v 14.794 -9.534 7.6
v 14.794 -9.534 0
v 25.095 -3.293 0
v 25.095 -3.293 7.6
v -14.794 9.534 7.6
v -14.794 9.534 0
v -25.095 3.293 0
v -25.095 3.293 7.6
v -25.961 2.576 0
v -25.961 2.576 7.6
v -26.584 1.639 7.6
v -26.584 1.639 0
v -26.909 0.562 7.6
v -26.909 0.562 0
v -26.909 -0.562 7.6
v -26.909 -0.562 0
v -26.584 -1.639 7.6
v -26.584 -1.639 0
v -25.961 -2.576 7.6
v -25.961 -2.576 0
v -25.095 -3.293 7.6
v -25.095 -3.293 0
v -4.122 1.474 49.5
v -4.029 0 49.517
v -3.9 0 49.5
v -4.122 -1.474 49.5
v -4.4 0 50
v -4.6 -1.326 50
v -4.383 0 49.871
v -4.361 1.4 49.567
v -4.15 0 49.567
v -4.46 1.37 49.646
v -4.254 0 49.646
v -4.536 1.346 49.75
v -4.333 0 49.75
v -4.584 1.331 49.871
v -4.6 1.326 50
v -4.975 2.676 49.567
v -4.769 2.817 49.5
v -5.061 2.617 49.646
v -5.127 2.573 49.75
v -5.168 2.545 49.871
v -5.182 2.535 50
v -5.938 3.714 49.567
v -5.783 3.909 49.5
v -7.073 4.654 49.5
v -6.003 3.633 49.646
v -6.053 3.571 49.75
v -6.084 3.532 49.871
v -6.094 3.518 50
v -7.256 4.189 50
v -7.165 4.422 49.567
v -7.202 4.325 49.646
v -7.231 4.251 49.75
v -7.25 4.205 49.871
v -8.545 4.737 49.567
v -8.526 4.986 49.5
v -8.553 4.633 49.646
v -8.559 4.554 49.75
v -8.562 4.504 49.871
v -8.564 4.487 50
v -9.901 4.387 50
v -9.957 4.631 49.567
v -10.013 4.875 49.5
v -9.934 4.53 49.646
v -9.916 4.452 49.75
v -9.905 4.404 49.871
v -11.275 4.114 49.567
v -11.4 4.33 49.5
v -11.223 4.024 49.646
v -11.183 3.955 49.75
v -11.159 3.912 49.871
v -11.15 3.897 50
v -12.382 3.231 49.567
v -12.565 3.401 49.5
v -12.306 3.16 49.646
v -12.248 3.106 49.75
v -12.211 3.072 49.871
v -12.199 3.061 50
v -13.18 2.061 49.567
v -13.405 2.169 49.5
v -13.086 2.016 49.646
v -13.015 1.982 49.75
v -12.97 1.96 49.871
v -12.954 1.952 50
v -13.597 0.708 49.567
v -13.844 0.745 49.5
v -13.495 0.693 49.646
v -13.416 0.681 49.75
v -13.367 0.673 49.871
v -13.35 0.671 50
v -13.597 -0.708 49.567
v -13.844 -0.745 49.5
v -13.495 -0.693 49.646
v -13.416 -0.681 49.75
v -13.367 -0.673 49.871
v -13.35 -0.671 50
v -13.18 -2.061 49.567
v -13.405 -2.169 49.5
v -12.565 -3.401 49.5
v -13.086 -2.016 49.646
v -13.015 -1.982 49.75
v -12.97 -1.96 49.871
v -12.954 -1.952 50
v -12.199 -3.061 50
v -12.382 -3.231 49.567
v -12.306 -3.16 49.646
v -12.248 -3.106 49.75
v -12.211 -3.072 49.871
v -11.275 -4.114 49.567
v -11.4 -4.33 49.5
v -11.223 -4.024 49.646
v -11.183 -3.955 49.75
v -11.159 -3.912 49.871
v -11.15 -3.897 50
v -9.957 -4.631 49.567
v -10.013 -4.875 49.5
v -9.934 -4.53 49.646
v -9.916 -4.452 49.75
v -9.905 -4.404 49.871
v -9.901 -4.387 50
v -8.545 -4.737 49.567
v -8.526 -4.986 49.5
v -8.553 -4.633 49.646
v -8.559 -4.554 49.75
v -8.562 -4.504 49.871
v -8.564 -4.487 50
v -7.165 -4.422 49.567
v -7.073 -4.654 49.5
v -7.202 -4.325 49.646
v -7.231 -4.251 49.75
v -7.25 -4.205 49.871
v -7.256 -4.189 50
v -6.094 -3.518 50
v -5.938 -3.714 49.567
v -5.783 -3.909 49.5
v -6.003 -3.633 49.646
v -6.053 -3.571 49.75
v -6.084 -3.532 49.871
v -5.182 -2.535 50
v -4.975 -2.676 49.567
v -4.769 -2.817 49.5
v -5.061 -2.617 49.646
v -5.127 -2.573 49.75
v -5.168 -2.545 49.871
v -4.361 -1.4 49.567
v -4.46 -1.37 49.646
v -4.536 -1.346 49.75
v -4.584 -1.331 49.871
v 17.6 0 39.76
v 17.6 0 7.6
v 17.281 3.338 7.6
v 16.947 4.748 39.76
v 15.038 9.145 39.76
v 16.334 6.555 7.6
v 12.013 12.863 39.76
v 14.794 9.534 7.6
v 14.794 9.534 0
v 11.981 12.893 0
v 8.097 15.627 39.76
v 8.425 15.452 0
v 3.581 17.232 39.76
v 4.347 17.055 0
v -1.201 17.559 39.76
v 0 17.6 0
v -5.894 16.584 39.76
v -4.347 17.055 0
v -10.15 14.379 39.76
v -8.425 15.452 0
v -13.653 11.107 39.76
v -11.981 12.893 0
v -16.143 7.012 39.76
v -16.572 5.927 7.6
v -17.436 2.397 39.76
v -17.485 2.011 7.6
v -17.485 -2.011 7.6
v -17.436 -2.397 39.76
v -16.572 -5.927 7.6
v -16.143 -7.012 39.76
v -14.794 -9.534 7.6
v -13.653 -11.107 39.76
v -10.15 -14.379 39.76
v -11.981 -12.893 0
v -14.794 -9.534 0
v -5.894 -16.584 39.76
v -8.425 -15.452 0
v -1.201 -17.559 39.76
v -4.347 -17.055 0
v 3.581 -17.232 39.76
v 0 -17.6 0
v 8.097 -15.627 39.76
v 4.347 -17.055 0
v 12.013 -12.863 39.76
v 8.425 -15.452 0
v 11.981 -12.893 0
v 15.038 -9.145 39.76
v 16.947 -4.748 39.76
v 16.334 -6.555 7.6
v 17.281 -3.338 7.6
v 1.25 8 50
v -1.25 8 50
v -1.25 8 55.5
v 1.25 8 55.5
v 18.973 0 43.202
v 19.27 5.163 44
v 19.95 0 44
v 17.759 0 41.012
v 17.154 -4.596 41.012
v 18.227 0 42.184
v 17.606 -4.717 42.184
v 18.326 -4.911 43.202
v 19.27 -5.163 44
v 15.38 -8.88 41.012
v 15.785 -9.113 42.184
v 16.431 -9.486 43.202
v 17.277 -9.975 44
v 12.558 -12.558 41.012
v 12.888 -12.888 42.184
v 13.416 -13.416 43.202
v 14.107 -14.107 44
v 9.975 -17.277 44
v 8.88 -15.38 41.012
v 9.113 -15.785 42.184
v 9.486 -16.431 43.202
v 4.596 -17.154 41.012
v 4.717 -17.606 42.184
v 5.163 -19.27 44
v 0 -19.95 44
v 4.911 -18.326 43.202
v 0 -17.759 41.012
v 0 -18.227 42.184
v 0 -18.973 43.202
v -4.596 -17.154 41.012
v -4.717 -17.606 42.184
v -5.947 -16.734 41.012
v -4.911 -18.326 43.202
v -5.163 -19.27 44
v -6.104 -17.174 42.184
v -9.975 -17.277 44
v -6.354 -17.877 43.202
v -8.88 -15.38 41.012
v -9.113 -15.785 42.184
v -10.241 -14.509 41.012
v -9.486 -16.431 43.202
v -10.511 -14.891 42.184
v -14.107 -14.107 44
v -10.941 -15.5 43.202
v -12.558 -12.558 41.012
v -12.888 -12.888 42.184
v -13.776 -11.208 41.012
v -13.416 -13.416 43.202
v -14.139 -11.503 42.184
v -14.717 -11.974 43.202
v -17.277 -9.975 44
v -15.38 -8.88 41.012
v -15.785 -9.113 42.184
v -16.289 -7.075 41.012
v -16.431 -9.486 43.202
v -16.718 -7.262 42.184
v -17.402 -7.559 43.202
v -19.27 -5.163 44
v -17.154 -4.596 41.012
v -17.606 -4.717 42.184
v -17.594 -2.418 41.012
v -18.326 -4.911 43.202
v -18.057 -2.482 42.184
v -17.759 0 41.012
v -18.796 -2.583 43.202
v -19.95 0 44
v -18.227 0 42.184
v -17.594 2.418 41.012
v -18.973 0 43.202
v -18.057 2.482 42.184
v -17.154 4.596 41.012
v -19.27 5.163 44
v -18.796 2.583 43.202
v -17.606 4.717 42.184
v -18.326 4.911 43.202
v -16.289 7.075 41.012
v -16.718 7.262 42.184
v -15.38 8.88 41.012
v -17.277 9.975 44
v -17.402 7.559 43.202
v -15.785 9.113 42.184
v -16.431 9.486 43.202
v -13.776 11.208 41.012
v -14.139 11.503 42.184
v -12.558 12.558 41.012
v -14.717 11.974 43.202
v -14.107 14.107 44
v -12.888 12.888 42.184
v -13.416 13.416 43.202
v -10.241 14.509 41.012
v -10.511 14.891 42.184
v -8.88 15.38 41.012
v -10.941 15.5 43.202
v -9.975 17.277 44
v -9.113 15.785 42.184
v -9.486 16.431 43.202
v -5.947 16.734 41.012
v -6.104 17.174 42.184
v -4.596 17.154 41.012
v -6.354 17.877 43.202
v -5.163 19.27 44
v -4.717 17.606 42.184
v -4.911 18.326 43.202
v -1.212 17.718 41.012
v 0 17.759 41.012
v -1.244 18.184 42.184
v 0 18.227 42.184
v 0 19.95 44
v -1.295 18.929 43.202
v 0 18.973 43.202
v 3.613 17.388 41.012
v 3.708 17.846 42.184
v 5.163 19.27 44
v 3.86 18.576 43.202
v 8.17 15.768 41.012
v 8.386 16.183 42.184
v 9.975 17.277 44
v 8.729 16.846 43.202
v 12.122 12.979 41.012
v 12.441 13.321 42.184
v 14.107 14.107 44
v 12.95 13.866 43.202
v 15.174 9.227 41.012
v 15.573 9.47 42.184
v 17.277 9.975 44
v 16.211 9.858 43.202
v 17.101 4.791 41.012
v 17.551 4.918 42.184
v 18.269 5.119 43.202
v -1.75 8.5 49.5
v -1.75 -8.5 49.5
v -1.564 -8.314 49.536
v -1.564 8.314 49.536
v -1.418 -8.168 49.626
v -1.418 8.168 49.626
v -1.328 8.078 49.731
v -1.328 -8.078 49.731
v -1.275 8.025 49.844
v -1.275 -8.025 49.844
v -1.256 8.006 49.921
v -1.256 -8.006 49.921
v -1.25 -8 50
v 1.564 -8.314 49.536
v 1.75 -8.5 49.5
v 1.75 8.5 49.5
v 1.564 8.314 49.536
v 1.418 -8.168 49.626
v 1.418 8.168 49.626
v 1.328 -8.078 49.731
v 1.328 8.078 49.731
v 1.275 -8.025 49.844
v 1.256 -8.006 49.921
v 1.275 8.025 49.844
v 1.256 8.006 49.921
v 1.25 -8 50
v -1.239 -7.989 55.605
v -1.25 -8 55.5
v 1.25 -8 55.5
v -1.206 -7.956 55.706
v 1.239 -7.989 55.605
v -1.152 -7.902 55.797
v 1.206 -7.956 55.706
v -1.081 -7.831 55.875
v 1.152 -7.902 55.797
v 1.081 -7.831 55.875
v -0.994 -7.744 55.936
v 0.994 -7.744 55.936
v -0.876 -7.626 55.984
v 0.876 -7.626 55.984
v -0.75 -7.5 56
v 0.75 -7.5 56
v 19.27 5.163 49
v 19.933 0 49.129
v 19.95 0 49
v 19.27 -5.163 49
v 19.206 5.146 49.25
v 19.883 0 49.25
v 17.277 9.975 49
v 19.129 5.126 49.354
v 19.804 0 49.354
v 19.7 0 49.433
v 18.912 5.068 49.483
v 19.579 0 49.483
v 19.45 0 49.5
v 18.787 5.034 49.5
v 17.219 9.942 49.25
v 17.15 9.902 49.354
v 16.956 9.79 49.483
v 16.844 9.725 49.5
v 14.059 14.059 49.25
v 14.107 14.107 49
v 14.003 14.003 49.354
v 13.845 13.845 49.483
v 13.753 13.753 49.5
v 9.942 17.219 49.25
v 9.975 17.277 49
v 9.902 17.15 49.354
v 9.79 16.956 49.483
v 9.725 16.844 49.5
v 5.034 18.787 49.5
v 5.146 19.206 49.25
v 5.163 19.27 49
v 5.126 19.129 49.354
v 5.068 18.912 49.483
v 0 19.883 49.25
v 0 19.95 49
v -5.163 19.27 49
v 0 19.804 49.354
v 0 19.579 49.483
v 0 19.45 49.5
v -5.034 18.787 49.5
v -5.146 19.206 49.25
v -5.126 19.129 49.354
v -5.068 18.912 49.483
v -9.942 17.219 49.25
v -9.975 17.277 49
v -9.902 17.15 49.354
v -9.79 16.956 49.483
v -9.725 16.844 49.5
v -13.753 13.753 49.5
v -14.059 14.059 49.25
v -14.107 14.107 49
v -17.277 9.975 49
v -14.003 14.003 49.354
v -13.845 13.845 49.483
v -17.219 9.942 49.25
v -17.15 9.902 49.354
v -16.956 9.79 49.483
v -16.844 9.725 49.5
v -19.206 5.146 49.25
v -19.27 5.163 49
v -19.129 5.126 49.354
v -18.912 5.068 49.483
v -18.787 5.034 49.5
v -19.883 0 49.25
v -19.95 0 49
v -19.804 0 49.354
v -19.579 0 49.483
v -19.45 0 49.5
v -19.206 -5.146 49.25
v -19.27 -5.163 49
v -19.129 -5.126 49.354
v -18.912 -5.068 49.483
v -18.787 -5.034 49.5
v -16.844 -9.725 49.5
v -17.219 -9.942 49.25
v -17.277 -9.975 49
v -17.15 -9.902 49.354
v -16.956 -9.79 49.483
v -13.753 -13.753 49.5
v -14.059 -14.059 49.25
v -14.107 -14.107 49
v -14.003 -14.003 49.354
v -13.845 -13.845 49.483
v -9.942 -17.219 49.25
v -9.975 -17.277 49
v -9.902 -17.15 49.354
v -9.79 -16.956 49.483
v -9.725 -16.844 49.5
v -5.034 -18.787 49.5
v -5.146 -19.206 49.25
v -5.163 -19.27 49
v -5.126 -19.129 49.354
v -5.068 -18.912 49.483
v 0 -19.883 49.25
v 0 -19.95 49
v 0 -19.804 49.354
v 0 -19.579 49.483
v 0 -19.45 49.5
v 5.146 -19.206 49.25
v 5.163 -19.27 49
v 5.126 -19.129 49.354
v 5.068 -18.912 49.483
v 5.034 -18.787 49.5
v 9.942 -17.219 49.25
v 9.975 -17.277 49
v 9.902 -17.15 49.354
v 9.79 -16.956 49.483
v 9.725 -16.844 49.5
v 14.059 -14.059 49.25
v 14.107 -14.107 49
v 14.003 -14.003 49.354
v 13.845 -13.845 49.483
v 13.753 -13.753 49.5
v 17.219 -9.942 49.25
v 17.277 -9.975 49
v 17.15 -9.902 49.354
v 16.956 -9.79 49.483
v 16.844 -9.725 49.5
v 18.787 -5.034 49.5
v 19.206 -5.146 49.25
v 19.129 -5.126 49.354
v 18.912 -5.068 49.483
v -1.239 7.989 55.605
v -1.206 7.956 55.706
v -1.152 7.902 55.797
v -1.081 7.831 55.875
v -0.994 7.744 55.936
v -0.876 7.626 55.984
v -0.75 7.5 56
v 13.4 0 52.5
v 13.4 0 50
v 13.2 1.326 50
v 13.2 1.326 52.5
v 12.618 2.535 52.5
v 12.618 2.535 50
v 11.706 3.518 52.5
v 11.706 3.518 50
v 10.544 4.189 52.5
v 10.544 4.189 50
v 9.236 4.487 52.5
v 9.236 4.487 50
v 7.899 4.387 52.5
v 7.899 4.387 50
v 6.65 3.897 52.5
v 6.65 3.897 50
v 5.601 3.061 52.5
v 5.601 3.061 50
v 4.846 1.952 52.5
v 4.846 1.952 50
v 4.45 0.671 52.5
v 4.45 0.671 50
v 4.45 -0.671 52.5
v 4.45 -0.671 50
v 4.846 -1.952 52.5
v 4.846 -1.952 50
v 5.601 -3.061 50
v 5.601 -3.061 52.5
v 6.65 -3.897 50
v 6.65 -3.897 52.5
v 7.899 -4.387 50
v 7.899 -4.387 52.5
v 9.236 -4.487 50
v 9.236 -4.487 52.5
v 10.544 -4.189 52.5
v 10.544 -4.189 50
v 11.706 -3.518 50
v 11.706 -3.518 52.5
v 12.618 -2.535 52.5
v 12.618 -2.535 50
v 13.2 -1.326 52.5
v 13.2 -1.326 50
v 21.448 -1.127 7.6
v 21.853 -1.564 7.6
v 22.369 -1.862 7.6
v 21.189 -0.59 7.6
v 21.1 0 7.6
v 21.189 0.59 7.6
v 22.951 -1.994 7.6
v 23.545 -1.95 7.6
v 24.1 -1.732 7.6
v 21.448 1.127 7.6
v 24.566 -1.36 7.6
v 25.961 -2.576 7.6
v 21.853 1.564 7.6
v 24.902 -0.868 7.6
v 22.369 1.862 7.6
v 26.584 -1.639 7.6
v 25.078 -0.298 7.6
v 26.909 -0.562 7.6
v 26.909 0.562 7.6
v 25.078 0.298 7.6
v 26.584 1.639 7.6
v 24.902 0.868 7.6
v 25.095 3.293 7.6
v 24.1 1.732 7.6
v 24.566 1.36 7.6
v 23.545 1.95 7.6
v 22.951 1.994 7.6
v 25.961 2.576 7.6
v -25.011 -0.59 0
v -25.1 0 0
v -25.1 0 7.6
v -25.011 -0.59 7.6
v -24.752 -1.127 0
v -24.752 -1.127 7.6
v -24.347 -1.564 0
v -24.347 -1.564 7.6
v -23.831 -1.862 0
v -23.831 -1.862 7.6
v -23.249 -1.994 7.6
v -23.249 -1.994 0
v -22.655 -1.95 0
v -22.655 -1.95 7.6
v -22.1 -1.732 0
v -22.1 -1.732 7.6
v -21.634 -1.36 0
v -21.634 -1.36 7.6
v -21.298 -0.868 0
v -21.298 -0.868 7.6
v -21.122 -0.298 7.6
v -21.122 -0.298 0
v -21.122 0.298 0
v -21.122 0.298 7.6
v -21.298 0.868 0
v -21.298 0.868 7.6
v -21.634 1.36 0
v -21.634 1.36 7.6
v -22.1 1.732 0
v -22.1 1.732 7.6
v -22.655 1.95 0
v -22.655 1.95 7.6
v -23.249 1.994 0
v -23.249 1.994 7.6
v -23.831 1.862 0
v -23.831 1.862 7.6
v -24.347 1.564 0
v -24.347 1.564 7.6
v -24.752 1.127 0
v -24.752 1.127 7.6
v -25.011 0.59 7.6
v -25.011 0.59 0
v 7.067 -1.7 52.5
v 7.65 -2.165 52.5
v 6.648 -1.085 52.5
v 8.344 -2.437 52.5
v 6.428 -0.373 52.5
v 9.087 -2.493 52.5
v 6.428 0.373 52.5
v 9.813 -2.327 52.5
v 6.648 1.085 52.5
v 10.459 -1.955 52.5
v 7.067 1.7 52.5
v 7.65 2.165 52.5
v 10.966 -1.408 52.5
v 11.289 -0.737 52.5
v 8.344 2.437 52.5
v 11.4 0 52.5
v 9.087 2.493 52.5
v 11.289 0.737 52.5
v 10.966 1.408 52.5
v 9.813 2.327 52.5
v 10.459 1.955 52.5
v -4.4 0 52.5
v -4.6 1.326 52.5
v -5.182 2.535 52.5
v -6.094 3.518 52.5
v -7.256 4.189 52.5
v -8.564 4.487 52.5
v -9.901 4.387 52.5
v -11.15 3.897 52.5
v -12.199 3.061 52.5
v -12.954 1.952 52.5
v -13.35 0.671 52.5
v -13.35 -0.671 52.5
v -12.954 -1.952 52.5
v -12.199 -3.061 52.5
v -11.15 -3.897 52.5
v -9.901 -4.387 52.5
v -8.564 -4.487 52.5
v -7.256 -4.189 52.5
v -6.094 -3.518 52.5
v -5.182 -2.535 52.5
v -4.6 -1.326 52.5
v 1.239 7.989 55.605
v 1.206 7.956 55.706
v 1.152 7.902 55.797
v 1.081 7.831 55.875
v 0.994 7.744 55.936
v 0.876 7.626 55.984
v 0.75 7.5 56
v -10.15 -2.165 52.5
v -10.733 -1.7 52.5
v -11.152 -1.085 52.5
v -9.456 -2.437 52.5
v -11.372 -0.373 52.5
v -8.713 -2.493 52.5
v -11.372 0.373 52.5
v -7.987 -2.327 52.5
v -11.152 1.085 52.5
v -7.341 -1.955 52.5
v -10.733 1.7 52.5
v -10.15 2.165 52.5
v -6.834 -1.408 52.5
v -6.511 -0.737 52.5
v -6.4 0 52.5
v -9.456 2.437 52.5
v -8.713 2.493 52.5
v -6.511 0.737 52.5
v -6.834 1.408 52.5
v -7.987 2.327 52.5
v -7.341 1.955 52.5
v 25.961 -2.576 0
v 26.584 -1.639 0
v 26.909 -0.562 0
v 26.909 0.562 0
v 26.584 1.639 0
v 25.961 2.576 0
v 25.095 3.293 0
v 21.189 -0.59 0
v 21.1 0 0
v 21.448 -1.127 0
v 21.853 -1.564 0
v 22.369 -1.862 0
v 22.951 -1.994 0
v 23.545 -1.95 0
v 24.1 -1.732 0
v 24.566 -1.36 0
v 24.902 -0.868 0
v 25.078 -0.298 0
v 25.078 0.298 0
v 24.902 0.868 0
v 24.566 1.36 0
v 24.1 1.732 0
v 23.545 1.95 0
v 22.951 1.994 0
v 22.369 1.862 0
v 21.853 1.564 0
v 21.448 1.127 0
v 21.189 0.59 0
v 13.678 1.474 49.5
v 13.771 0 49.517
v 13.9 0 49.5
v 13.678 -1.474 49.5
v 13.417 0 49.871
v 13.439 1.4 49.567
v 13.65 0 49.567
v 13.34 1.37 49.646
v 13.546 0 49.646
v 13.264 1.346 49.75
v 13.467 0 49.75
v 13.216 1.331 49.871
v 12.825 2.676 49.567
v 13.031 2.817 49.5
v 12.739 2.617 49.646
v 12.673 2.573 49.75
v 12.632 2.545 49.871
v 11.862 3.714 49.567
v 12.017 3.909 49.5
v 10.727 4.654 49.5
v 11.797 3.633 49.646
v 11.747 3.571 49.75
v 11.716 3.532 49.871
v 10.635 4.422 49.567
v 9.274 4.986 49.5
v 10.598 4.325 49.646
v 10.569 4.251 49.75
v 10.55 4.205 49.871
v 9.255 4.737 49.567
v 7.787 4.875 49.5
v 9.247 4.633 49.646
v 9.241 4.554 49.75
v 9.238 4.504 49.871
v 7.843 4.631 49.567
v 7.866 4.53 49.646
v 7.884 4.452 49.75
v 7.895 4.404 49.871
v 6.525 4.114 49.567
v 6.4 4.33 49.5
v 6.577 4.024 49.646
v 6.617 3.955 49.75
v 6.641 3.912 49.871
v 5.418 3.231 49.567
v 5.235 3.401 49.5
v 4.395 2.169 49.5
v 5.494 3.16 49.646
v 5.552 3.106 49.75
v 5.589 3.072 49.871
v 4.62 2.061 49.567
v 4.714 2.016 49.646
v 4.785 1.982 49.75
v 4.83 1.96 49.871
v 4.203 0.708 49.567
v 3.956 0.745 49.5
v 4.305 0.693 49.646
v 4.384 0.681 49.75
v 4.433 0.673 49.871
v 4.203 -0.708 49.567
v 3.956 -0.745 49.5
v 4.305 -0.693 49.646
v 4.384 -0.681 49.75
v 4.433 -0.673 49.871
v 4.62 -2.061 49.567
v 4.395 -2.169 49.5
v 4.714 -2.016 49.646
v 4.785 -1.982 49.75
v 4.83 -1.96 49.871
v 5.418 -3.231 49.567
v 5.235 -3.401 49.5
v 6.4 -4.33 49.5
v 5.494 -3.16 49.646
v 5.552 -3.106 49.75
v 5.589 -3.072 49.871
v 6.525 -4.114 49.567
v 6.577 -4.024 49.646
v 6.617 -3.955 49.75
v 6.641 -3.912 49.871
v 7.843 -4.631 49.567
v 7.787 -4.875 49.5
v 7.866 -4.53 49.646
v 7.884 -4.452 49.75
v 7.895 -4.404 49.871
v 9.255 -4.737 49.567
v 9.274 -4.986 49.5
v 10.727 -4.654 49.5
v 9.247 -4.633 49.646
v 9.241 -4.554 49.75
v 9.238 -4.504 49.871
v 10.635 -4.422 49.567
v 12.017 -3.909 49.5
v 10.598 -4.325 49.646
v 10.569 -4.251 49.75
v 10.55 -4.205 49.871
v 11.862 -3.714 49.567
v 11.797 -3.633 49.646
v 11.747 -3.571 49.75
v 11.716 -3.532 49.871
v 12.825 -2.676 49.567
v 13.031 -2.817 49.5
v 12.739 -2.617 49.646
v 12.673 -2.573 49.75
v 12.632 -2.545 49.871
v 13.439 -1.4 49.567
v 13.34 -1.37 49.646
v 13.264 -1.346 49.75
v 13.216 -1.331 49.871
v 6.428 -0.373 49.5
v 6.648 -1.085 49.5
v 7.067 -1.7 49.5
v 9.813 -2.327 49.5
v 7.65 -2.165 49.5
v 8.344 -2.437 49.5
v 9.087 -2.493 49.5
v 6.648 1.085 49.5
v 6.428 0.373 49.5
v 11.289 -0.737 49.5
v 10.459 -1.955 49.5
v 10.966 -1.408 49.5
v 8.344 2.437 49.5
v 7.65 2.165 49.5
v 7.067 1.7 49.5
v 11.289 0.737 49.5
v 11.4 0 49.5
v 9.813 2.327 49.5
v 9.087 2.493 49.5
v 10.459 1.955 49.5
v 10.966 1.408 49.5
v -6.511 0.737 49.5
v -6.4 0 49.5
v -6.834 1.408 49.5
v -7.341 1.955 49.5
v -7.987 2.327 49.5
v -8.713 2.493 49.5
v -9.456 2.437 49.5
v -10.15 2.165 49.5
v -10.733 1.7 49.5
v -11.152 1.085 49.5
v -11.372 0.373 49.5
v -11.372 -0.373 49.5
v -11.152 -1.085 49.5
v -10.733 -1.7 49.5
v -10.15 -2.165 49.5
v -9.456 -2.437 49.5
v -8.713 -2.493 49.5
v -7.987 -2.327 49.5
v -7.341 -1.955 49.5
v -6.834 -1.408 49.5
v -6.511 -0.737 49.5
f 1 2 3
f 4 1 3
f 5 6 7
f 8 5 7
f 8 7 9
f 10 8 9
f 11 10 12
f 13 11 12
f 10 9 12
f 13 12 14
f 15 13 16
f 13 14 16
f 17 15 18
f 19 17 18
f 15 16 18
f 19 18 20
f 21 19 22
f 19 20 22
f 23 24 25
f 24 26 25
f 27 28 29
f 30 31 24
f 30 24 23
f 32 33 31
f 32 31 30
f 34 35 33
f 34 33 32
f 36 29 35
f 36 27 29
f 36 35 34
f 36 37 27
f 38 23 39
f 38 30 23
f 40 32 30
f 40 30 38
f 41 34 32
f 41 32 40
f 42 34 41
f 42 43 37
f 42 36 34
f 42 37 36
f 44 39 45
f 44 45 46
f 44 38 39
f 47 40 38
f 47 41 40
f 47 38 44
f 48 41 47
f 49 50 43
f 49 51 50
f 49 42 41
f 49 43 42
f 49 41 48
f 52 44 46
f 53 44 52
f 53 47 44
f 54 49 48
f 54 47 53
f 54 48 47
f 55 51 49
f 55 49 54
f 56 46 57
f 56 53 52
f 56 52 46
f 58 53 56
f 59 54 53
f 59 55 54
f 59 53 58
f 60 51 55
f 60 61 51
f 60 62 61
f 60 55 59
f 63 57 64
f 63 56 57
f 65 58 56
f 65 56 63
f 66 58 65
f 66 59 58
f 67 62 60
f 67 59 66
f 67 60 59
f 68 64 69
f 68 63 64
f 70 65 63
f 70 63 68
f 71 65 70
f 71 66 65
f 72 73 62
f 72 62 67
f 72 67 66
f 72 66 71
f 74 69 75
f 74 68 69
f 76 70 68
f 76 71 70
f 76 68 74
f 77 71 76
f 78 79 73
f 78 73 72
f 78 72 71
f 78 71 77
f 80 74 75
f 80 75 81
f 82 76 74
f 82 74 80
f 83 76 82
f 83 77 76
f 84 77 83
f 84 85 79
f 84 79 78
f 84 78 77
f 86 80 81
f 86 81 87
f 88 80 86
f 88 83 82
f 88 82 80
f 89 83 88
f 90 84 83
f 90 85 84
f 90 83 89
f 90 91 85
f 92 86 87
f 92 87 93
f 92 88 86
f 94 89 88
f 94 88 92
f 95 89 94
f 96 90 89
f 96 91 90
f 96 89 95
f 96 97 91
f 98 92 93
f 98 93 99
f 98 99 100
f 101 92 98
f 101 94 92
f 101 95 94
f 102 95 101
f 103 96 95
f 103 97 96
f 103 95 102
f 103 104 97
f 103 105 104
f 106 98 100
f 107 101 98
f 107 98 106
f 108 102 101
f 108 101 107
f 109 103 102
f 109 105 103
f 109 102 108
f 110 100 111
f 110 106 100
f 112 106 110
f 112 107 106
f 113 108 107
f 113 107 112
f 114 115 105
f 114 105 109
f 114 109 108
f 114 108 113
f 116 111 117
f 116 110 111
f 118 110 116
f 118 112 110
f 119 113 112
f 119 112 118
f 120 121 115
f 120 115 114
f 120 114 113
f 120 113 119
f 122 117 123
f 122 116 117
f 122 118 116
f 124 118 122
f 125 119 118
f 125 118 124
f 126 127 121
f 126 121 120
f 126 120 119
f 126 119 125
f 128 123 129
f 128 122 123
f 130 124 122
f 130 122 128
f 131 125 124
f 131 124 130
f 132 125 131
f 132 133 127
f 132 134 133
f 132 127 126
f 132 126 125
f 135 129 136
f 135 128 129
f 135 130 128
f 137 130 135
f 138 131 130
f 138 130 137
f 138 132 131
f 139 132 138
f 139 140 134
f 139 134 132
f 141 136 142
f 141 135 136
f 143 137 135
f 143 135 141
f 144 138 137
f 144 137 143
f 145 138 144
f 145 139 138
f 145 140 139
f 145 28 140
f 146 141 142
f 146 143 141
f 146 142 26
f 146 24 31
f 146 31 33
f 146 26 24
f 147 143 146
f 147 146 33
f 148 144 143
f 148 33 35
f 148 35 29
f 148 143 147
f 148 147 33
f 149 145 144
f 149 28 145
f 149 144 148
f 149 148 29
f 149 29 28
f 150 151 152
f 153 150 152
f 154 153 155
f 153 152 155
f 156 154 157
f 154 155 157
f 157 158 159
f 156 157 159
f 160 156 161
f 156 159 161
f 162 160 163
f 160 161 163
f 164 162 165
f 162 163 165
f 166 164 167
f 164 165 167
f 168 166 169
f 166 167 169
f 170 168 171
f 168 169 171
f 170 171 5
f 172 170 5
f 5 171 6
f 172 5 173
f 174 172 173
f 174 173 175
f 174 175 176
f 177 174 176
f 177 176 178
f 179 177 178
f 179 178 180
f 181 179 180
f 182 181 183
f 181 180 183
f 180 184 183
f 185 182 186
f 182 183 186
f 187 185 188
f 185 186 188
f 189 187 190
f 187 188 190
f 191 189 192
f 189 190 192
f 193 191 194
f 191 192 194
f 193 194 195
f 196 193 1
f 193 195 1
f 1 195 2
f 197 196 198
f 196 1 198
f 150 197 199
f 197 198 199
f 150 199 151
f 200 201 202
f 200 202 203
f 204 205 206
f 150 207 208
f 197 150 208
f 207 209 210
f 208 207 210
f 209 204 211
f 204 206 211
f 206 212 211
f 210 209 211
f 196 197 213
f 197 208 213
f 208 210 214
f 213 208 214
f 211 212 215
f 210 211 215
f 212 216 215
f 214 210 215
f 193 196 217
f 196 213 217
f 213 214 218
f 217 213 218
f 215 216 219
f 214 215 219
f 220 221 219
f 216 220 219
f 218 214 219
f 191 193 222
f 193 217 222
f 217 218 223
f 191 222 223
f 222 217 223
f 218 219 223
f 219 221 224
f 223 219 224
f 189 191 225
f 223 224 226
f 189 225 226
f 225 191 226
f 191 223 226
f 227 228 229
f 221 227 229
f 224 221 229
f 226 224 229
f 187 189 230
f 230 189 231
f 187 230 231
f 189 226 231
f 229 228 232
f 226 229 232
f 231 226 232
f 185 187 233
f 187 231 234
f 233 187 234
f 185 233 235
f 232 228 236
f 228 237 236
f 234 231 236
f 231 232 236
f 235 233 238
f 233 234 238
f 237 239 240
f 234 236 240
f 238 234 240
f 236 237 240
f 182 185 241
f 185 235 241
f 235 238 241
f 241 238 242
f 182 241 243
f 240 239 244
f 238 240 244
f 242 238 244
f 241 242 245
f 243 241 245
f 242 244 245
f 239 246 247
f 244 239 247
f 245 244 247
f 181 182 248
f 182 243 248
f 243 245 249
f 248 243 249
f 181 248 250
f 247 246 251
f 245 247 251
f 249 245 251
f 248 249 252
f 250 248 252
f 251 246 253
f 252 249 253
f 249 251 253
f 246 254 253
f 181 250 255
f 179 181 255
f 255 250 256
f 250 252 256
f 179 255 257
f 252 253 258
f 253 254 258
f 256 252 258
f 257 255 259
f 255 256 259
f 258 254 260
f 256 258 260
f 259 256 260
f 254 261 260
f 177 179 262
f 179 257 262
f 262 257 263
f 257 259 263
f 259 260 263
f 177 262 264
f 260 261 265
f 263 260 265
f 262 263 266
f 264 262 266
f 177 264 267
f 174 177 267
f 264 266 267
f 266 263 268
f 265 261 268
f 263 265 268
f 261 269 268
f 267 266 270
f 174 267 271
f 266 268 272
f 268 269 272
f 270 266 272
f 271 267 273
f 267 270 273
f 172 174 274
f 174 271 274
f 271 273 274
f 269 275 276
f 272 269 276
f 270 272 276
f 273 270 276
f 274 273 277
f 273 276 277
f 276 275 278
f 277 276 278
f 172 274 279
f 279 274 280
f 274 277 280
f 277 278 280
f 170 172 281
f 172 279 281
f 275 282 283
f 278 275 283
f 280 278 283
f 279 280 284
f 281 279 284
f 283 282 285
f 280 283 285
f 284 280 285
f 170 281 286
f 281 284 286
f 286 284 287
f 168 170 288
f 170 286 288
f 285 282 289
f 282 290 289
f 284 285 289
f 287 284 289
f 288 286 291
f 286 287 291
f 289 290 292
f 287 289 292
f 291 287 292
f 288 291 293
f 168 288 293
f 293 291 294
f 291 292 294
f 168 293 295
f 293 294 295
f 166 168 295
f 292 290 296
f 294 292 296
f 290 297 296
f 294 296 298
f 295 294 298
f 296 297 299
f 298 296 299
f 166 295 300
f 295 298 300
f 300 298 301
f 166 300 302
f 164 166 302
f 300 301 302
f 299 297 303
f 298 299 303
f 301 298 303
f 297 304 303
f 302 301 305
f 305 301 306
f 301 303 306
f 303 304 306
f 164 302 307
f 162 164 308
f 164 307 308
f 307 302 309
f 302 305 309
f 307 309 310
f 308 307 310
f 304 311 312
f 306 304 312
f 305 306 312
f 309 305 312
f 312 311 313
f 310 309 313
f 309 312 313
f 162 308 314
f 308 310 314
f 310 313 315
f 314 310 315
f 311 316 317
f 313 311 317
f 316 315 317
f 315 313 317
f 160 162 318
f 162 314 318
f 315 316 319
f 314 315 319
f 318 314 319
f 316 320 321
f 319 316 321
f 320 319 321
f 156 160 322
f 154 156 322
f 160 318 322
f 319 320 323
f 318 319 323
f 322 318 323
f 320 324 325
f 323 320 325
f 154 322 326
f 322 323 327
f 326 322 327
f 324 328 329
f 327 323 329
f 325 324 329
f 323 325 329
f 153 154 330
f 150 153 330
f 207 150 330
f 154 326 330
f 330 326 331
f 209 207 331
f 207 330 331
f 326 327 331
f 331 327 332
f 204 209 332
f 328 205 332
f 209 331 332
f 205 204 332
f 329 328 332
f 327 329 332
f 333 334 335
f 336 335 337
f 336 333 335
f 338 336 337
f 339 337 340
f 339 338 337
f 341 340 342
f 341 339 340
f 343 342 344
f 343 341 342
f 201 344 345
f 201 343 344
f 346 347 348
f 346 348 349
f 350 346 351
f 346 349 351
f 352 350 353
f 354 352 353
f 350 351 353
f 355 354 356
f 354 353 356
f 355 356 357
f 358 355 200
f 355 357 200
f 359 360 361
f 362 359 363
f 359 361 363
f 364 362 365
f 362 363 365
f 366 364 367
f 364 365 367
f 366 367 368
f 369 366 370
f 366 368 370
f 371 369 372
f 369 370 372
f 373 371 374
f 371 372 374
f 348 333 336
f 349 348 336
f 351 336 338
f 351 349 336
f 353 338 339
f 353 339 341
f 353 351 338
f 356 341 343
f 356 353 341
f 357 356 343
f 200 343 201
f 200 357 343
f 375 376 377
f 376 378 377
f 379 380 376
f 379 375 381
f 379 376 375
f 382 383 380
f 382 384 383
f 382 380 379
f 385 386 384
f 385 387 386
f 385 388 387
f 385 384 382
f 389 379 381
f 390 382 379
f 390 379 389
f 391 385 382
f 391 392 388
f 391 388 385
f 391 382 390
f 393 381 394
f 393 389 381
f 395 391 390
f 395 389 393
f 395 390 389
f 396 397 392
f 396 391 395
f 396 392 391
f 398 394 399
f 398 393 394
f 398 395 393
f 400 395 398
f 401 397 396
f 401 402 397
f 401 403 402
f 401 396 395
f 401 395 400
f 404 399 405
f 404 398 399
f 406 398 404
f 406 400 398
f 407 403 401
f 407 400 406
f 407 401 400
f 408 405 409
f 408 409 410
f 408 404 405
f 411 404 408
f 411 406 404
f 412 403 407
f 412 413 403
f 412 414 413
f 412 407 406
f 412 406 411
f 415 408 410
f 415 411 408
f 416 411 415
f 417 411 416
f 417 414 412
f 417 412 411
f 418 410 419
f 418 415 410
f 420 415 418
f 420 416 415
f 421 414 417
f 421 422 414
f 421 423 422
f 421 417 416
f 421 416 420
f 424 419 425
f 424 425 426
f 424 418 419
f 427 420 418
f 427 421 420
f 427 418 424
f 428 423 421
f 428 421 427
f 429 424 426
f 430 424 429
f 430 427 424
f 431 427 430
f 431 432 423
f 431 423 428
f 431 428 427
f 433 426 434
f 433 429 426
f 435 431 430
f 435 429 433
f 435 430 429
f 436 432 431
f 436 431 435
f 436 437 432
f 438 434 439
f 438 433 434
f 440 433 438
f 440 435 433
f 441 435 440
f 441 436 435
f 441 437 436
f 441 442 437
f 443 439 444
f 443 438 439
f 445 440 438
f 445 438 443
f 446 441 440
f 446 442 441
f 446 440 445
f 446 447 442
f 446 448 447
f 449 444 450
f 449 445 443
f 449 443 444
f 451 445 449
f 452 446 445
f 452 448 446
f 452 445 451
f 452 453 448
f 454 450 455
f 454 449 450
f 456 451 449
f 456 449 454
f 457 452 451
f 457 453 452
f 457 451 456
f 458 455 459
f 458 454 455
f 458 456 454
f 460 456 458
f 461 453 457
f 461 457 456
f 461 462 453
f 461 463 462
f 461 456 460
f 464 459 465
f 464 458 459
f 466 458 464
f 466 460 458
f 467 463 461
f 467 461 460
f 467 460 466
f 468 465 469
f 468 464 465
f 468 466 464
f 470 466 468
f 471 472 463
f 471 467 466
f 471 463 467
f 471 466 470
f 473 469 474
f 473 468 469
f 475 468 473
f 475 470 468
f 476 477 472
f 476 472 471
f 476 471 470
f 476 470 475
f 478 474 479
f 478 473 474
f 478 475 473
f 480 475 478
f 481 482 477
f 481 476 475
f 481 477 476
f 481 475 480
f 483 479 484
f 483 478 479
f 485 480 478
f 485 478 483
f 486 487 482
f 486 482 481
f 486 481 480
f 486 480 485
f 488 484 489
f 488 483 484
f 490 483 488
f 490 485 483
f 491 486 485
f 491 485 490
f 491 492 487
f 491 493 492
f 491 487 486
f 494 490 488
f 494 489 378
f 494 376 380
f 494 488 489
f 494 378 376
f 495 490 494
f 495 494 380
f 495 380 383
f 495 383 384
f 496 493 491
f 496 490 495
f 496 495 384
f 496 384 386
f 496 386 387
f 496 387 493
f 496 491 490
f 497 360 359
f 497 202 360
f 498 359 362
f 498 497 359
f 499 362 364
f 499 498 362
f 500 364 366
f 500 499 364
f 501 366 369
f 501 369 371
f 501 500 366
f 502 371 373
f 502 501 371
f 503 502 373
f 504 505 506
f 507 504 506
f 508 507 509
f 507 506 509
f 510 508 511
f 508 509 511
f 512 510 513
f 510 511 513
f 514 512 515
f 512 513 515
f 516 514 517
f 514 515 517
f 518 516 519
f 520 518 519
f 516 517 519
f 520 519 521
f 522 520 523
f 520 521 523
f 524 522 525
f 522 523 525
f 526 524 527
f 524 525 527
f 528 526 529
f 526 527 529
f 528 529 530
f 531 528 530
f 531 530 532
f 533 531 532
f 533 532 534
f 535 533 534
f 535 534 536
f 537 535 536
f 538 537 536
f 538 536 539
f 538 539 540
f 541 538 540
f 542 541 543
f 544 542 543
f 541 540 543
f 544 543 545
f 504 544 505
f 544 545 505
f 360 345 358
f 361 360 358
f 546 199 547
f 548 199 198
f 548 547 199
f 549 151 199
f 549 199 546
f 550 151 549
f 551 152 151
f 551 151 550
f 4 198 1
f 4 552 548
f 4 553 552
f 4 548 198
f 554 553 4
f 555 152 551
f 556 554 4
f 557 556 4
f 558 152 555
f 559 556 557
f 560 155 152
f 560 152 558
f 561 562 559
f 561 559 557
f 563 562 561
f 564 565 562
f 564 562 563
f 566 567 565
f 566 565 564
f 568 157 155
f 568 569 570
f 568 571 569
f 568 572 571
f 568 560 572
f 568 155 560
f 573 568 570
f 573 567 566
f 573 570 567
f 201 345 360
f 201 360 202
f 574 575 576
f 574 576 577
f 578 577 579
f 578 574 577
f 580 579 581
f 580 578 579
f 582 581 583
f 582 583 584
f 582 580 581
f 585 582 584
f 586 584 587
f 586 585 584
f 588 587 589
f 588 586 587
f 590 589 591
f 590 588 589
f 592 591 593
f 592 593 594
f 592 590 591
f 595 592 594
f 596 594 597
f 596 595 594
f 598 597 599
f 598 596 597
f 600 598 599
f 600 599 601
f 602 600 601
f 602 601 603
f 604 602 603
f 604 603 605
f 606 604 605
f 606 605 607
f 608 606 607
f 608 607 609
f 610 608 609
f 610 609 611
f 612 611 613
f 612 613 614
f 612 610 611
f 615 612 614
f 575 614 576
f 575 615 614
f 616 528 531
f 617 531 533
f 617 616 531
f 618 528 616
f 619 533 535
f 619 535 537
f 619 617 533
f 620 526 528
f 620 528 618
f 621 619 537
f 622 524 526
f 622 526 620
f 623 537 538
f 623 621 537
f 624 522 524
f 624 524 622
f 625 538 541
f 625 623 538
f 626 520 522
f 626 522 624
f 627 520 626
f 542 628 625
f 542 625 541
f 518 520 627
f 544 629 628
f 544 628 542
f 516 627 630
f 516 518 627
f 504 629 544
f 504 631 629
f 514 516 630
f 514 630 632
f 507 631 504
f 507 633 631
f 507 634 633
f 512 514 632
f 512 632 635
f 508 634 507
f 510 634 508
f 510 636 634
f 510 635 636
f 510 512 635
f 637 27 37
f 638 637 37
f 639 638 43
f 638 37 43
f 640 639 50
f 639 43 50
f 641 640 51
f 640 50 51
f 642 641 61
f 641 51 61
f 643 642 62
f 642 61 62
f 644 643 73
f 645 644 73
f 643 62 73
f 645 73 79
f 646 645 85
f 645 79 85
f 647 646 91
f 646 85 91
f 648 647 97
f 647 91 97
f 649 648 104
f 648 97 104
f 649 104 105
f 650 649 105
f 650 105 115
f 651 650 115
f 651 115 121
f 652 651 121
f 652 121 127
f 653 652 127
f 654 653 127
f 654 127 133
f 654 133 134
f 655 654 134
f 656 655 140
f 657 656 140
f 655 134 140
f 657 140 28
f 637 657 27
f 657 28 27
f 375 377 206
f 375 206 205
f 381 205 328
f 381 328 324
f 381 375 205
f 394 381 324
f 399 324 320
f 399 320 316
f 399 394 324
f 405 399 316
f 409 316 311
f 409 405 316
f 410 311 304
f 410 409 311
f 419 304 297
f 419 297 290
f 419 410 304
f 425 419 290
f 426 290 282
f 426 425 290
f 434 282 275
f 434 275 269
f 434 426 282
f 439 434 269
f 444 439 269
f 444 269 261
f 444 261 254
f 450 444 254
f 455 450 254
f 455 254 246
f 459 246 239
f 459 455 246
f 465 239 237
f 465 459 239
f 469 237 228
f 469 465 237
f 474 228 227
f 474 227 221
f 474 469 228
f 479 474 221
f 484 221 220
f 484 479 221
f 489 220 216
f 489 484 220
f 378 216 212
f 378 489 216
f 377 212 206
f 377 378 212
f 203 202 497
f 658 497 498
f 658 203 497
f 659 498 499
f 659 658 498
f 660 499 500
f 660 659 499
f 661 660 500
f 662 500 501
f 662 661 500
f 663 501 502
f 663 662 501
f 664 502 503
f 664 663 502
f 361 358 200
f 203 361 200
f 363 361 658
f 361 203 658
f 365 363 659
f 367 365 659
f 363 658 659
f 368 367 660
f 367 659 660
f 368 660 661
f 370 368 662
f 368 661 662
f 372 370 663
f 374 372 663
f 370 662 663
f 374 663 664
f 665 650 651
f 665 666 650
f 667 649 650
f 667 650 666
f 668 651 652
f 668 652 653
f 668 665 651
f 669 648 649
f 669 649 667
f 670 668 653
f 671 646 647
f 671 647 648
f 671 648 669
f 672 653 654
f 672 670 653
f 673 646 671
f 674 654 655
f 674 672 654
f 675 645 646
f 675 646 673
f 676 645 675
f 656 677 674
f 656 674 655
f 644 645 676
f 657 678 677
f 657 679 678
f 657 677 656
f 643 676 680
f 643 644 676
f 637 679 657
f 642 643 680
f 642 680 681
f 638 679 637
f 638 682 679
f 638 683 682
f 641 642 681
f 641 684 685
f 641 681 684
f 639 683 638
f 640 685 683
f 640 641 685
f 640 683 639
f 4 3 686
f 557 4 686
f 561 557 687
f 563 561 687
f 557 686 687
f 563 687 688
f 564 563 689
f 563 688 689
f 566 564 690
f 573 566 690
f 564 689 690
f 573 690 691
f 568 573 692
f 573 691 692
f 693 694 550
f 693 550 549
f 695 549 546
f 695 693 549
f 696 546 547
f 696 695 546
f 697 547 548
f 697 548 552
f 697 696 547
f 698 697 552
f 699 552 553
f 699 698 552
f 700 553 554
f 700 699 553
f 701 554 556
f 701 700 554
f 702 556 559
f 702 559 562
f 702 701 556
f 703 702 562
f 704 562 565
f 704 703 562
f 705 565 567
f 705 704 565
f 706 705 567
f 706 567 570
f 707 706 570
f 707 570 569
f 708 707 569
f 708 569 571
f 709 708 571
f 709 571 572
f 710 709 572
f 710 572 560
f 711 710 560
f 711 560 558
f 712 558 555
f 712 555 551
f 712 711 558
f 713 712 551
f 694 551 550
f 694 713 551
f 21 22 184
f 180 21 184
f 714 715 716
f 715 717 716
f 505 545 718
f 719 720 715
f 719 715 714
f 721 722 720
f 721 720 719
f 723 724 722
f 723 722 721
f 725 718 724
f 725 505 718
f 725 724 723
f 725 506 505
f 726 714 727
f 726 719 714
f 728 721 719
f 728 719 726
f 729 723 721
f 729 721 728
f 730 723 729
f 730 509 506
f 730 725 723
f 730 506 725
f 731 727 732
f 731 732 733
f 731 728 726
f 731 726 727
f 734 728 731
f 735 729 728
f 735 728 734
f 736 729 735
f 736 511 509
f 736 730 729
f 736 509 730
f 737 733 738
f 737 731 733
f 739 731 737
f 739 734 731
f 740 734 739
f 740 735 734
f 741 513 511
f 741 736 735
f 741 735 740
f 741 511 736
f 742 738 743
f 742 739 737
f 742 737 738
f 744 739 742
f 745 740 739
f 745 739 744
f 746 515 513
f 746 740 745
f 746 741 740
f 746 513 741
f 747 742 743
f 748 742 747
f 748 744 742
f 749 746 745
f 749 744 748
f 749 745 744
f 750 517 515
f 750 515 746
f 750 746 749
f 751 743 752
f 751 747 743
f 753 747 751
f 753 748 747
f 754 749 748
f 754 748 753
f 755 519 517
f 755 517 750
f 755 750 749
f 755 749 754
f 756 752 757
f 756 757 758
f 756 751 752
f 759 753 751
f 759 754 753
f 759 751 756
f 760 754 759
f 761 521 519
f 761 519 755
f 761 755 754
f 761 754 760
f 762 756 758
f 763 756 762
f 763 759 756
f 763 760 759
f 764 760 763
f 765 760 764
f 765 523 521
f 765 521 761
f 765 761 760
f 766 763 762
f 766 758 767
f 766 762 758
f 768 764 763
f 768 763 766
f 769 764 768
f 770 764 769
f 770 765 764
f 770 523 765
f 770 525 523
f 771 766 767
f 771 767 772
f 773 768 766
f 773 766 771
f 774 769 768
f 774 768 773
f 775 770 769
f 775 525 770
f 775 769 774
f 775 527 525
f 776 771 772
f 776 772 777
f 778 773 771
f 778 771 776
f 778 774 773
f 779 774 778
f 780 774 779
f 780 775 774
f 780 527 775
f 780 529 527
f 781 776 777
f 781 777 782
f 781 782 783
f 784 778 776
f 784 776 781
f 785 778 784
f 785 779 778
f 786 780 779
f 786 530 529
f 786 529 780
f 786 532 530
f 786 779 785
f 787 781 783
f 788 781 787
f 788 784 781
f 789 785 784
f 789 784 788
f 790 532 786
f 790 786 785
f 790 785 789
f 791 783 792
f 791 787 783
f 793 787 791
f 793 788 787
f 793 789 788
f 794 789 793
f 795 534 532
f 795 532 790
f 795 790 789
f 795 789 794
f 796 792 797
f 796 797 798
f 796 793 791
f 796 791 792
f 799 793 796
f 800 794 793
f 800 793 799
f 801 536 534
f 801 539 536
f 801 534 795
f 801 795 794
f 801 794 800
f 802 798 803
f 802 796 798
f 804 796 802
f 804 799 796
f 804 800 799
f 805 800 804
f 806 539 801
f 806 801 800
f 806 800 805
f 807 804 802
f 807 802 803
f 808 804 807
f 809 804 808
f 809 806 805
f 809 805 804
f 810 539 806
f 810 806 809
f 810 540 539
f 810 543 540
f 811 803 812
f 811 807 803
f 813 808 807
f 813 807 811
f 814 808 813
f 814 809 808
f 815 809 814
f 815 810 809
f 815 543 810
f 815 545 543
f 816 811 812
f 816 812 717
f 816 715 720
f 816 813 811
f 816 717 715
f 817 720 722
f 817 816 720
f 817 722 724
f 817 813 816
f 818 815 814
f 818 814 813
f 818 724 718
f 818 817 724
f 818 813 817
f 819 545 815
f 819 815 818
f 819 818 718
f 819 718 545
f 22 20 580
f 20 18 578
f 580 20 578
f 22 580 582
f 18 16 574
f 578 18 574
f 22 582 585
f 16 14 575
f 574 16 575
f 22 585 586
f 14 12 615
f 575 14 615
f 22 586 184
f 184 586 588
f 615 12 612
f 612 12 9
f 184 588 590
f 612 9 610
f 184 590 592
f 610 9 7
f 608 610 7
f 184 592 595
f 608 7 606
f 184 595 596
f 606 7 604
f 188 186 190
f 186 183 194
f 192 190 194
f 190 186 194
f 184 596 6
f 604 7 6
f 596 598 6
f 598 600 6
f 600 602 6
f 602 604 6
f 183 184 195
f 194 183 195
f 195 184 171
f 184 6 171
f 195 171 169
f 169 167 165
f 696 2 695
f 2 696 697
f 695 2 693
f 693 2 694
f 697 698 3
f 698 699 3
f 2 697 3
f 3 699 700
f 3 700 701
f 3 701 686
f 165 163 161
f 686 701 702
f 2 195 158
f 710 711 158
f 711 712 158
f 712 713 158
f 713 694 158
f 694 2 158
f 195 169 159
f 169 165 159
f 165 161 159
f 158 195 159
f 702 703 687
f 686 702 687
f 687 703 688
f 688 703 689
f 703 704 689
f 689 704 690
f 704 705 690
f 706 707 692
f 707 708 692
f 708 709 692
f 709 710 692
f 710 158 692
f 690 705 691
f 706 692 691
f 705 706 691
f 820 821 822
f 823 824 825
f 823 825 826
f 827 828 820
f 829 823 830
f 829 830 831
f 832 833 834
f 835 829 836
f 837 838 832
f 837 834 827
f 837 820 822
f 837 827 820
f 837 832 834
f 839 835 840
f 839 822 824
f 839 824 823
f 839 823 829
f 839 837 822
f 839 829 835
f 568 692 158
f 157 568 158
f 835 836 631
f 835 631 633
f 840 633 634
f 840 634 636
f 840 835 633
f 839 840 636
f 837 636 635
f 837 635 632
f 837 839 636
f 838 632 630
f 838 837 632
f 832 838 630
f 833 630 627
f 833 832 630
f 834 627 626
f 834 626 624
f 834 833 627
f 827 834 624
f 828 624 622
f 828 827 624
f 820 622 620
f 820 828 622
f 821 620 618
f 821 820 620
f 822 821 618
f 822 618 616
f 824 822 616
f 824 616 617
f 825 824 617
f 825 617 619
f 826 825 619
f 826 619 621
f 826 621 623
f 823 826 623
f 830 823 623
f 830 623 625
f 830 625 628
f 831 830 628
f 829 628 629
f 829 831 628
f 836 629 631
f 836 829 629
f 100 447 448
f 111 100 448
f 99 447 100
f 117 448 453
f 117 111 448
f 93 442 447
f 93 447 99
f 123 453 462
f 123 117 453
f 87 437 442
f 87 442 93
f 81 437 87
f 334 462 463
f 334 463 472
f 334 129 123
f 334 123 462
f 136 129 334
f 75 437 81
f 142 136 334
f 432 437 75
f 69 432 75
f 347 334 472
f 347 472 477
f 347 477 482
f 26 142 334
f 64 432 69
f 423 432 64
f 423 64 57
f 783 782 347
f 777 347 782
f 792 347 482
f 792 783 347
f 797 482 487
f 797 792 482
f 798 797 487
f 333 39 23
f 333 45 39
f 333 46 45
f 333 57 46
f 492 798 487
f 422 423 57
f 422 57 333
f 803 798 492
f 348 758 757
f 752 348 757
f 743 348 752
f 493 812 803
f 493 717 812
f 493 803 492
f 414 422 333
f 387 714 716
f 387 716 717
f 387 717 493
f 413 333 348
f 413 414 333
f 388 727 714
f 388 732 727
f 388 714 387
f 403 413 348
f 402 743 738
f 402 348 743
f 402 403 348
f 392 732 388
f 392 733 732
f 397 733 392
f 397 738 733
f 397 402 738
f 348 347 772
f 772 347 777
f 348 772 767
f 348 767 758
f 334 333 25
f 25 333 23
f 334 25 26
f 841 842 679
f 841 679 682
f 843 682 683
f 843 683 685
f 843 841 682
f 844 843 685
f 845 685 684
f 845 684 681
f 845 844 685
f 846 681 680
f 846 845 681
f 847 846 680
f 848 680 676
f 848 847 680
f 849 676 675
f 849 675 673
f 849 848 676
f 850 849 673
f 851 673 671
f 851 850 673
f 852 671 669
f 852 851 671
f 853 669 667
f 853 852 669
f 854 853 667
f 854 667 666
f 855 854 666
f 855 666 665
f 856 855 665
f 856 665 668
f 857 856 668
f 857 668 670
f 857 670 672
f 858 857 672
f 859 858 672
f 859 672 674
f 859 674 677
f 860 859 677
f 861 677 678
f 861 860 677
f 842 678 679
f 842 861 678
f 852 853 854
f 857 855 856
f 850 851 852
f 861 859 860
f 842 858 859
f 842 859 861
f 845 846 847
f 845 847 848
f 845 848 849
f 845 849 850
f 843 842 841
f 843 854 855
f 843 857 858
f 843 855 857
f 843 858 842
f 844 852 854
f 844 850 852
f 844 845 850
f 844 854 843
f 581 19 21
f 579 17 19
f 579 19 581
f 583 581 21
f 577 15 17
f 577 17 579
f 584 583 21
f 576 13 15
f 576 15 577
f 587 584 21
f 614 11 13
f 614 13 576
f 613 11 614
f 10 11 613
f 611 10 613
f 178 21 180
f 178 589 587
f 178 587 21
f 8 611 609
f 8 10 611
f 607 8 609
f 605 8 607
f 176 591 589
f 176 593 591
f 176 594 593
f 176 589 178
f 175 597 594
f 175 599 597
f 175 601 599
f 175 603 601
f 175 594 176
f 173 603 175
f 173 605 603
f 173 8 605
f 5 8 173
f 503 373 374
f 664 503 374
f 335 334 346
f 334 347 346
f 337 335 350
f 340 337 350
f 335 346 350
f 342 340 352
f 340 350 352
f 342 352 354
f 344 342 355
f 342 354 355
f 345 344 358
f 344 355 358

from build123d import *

# Parameters (mm, degrees)
SKETCH2_R           = 17.6
BOSS_EXTRUDE1_DEPTH = 52.5
SKETCH3_R           = 2
BOSS_EXTRUDE2_DEPTH = 7.6
SKETCH4_W           = 2.5
SKETCH4_H           = 16
BOSS_EXTRUDE3_DEPTH = 3.5
CUT_EXTRUDE1_START  = -3
SKETCH5_R           = 17.6
SKETCH5_R_2         = 4.5
SKETCH5_W           = 2.5
SKETCH5_H           = 16
SKETCH5_R_3         = 2.5
CUT_EXTRUDE1_DEPTH  = 3
SKETCH7_R           = 19.95
BOSS_EXTRUDE5_DEPTH = 5.5
FILLET3_R           = 5
FILLET4_R           = 0.5


with BuildPart() as part:
    # Sketch2 → Boss-Extrude1 (new body)
    with BuildSketch(Plane.XY):
        Circle(SKETCH2_R)
    extrude(amount=BOSS_EXTRUDE1_DEPTH)

    # Sketch3 → Boss-Extrude2 (add)
    # profile 1 of 2: a face of its own
    with BuildSketch(Plane.XY):
        with BuildLine():
            Line((-14.793995556, 9.534028294), (-25.095041698, 3.292766105))
            ThreePointArc((-25.095041698, 3.292766105), (-26.95, 0), (-25.095041698, -3.292766105))
            Line((-25.095041698, -3.292766105), (-14.793995556, -9.534028294))
            ThreePointArc((-14.793995556, -9.534028294), (-17.6, 0), (-14.793995556, 9.534028294))
        make_face()
        with Locations(Location((-23.1, 0, 0), (0, 0, 180))):
            Circle(SKETCH3_R, mode=Mode.SUBTRACT)
    # profile 2 of 2: a face of its own
    with BuildSketch(Plane.XY):
        with BuildLine():
            Line((25.095041698, 3.292766105), (14.793995556, 9.534028294))
            ThreePointArc((14.793995556, 9.534028294), (17.6, 0), (14.793995556, -9.534028294))
            Line((14.793995556, -9.534028294), (25.095041698, -3.292766105))
            ThreePointArc((25.095041698, -3.292766105), (26.95, 0), (25.095041698, 3.292766105))
        make_face()
        with Locations(Location((23.1, 0, 0), (0, 0, 180))):
            Circle(SKETCH3_R, mode=Mode.SUBTRACT)
    extrude(amount=BOSS_EXTRUDE2_DEPTH)

    # Sketch4 → Boss-Extrude3 (add)
    with BuildSketch(Plane.XY.offset(52.5)):
        Rectangle(SKETCH4_W, SKETCH4_H)
    extrude(amount=BOSS_EXTRUDE3_DEPTH)

    # Sketch5 → Cut-Extrude1 (cut)
    # profile 1 of 3: a face of its own
    with BuildSketch(Plane.XY.offset(52.5).offset(CUT_EXTRUDE1_START)):
        with Locations(Location((0, 0, 0), (0, 0, 147.200140228))):
            Circle(SKETCH5_R)
        with Locations((-8.9, 0)):
            Circle(SKETCH5_R_2, mode=Mode.SUBTRACT)
        with Locations((8.9, 0)):
            Circle(SKETCH5_R_2, mode=Mode.SUBTRACT)
        Rectangle(SKETCH5_W, SKETCH5_H, mode=Mode.SUBTRACT)
    # profile 2 of 3: a face of its own
    with BuildSketch(Plane.XY.offset(52.5).offset(CUT_EXTRUDE1_START)):
        with Locations((-8.9, 0)):
            Circle(SKETCH5_R_3)
    # profile 3 of 3: a face of its own
    with BuildSketch(Plane.XY.offset(52.5).offset(CUT_EXTRUDE1_START)):
        with Locations((8.9, 0)):
            Circle(SKETCH5_R_3)
    extrude(amount=CUT_EXTRUDE1_DEPTH, mode=Mode.SUBTRACT)

    # Sketch7 → Boss-Extrude5 (add)
    with BuildSketch(Plane.XY.offset(49.5)):
        Circle(SKETCH7_R)
    extrude(amount=-BOSS_EXTRUDE5_DEPTH)

    # Fillet3
    # the kernel refuses this fillet: 5 mm, written as the material it adds along each edge
    with BuildSketch(Plane(origin=(0, 0, 44), x_dir=(1, 0, 0), z_dir=(0, 1, 0))) as fillet3_piece_1:
        with BuildLine():
            CenterArc((22.6, 4.239988208), FILLET3_R, 180, 57.994545172)
            Line((19.95, 0), (19.897, -0.084799764))
            ThreePointArc((19.897, -0.084799764), (18.775, -0.1), (17.6, -0.1))
            Line((17.6, -0.1), (17.5, 0))
            Line((17.5, 0), (17.5, 4.239988208))
            Line((17.5, 4.239988208), (17.6, 4.239988208))
        make_face()
    revolve(axis=Axis((0, 0, 44), (0, 0, -1)))

    # Fillet4
    fillet4_edges = [part.edges().sort_by_distance(p)[0] for p in [
        (1.25, 0, 56),
        (0, 8, 56),
        (0, -8, 56),
        (-1.25, 0, 56),
        (0, 8, 49.5),
        (-1.25, 0, 49.5),
        (0, -8, 49.5),
        (1.25, 0, 49.5),
        (-13.4, 0, 49.5),
        (4.4, 0, 49.5),
        (-19.95, 0, 49.5),
    ]]
    fillet(fillet4_edges, radius=FILLET4_R)


solid = part.part
